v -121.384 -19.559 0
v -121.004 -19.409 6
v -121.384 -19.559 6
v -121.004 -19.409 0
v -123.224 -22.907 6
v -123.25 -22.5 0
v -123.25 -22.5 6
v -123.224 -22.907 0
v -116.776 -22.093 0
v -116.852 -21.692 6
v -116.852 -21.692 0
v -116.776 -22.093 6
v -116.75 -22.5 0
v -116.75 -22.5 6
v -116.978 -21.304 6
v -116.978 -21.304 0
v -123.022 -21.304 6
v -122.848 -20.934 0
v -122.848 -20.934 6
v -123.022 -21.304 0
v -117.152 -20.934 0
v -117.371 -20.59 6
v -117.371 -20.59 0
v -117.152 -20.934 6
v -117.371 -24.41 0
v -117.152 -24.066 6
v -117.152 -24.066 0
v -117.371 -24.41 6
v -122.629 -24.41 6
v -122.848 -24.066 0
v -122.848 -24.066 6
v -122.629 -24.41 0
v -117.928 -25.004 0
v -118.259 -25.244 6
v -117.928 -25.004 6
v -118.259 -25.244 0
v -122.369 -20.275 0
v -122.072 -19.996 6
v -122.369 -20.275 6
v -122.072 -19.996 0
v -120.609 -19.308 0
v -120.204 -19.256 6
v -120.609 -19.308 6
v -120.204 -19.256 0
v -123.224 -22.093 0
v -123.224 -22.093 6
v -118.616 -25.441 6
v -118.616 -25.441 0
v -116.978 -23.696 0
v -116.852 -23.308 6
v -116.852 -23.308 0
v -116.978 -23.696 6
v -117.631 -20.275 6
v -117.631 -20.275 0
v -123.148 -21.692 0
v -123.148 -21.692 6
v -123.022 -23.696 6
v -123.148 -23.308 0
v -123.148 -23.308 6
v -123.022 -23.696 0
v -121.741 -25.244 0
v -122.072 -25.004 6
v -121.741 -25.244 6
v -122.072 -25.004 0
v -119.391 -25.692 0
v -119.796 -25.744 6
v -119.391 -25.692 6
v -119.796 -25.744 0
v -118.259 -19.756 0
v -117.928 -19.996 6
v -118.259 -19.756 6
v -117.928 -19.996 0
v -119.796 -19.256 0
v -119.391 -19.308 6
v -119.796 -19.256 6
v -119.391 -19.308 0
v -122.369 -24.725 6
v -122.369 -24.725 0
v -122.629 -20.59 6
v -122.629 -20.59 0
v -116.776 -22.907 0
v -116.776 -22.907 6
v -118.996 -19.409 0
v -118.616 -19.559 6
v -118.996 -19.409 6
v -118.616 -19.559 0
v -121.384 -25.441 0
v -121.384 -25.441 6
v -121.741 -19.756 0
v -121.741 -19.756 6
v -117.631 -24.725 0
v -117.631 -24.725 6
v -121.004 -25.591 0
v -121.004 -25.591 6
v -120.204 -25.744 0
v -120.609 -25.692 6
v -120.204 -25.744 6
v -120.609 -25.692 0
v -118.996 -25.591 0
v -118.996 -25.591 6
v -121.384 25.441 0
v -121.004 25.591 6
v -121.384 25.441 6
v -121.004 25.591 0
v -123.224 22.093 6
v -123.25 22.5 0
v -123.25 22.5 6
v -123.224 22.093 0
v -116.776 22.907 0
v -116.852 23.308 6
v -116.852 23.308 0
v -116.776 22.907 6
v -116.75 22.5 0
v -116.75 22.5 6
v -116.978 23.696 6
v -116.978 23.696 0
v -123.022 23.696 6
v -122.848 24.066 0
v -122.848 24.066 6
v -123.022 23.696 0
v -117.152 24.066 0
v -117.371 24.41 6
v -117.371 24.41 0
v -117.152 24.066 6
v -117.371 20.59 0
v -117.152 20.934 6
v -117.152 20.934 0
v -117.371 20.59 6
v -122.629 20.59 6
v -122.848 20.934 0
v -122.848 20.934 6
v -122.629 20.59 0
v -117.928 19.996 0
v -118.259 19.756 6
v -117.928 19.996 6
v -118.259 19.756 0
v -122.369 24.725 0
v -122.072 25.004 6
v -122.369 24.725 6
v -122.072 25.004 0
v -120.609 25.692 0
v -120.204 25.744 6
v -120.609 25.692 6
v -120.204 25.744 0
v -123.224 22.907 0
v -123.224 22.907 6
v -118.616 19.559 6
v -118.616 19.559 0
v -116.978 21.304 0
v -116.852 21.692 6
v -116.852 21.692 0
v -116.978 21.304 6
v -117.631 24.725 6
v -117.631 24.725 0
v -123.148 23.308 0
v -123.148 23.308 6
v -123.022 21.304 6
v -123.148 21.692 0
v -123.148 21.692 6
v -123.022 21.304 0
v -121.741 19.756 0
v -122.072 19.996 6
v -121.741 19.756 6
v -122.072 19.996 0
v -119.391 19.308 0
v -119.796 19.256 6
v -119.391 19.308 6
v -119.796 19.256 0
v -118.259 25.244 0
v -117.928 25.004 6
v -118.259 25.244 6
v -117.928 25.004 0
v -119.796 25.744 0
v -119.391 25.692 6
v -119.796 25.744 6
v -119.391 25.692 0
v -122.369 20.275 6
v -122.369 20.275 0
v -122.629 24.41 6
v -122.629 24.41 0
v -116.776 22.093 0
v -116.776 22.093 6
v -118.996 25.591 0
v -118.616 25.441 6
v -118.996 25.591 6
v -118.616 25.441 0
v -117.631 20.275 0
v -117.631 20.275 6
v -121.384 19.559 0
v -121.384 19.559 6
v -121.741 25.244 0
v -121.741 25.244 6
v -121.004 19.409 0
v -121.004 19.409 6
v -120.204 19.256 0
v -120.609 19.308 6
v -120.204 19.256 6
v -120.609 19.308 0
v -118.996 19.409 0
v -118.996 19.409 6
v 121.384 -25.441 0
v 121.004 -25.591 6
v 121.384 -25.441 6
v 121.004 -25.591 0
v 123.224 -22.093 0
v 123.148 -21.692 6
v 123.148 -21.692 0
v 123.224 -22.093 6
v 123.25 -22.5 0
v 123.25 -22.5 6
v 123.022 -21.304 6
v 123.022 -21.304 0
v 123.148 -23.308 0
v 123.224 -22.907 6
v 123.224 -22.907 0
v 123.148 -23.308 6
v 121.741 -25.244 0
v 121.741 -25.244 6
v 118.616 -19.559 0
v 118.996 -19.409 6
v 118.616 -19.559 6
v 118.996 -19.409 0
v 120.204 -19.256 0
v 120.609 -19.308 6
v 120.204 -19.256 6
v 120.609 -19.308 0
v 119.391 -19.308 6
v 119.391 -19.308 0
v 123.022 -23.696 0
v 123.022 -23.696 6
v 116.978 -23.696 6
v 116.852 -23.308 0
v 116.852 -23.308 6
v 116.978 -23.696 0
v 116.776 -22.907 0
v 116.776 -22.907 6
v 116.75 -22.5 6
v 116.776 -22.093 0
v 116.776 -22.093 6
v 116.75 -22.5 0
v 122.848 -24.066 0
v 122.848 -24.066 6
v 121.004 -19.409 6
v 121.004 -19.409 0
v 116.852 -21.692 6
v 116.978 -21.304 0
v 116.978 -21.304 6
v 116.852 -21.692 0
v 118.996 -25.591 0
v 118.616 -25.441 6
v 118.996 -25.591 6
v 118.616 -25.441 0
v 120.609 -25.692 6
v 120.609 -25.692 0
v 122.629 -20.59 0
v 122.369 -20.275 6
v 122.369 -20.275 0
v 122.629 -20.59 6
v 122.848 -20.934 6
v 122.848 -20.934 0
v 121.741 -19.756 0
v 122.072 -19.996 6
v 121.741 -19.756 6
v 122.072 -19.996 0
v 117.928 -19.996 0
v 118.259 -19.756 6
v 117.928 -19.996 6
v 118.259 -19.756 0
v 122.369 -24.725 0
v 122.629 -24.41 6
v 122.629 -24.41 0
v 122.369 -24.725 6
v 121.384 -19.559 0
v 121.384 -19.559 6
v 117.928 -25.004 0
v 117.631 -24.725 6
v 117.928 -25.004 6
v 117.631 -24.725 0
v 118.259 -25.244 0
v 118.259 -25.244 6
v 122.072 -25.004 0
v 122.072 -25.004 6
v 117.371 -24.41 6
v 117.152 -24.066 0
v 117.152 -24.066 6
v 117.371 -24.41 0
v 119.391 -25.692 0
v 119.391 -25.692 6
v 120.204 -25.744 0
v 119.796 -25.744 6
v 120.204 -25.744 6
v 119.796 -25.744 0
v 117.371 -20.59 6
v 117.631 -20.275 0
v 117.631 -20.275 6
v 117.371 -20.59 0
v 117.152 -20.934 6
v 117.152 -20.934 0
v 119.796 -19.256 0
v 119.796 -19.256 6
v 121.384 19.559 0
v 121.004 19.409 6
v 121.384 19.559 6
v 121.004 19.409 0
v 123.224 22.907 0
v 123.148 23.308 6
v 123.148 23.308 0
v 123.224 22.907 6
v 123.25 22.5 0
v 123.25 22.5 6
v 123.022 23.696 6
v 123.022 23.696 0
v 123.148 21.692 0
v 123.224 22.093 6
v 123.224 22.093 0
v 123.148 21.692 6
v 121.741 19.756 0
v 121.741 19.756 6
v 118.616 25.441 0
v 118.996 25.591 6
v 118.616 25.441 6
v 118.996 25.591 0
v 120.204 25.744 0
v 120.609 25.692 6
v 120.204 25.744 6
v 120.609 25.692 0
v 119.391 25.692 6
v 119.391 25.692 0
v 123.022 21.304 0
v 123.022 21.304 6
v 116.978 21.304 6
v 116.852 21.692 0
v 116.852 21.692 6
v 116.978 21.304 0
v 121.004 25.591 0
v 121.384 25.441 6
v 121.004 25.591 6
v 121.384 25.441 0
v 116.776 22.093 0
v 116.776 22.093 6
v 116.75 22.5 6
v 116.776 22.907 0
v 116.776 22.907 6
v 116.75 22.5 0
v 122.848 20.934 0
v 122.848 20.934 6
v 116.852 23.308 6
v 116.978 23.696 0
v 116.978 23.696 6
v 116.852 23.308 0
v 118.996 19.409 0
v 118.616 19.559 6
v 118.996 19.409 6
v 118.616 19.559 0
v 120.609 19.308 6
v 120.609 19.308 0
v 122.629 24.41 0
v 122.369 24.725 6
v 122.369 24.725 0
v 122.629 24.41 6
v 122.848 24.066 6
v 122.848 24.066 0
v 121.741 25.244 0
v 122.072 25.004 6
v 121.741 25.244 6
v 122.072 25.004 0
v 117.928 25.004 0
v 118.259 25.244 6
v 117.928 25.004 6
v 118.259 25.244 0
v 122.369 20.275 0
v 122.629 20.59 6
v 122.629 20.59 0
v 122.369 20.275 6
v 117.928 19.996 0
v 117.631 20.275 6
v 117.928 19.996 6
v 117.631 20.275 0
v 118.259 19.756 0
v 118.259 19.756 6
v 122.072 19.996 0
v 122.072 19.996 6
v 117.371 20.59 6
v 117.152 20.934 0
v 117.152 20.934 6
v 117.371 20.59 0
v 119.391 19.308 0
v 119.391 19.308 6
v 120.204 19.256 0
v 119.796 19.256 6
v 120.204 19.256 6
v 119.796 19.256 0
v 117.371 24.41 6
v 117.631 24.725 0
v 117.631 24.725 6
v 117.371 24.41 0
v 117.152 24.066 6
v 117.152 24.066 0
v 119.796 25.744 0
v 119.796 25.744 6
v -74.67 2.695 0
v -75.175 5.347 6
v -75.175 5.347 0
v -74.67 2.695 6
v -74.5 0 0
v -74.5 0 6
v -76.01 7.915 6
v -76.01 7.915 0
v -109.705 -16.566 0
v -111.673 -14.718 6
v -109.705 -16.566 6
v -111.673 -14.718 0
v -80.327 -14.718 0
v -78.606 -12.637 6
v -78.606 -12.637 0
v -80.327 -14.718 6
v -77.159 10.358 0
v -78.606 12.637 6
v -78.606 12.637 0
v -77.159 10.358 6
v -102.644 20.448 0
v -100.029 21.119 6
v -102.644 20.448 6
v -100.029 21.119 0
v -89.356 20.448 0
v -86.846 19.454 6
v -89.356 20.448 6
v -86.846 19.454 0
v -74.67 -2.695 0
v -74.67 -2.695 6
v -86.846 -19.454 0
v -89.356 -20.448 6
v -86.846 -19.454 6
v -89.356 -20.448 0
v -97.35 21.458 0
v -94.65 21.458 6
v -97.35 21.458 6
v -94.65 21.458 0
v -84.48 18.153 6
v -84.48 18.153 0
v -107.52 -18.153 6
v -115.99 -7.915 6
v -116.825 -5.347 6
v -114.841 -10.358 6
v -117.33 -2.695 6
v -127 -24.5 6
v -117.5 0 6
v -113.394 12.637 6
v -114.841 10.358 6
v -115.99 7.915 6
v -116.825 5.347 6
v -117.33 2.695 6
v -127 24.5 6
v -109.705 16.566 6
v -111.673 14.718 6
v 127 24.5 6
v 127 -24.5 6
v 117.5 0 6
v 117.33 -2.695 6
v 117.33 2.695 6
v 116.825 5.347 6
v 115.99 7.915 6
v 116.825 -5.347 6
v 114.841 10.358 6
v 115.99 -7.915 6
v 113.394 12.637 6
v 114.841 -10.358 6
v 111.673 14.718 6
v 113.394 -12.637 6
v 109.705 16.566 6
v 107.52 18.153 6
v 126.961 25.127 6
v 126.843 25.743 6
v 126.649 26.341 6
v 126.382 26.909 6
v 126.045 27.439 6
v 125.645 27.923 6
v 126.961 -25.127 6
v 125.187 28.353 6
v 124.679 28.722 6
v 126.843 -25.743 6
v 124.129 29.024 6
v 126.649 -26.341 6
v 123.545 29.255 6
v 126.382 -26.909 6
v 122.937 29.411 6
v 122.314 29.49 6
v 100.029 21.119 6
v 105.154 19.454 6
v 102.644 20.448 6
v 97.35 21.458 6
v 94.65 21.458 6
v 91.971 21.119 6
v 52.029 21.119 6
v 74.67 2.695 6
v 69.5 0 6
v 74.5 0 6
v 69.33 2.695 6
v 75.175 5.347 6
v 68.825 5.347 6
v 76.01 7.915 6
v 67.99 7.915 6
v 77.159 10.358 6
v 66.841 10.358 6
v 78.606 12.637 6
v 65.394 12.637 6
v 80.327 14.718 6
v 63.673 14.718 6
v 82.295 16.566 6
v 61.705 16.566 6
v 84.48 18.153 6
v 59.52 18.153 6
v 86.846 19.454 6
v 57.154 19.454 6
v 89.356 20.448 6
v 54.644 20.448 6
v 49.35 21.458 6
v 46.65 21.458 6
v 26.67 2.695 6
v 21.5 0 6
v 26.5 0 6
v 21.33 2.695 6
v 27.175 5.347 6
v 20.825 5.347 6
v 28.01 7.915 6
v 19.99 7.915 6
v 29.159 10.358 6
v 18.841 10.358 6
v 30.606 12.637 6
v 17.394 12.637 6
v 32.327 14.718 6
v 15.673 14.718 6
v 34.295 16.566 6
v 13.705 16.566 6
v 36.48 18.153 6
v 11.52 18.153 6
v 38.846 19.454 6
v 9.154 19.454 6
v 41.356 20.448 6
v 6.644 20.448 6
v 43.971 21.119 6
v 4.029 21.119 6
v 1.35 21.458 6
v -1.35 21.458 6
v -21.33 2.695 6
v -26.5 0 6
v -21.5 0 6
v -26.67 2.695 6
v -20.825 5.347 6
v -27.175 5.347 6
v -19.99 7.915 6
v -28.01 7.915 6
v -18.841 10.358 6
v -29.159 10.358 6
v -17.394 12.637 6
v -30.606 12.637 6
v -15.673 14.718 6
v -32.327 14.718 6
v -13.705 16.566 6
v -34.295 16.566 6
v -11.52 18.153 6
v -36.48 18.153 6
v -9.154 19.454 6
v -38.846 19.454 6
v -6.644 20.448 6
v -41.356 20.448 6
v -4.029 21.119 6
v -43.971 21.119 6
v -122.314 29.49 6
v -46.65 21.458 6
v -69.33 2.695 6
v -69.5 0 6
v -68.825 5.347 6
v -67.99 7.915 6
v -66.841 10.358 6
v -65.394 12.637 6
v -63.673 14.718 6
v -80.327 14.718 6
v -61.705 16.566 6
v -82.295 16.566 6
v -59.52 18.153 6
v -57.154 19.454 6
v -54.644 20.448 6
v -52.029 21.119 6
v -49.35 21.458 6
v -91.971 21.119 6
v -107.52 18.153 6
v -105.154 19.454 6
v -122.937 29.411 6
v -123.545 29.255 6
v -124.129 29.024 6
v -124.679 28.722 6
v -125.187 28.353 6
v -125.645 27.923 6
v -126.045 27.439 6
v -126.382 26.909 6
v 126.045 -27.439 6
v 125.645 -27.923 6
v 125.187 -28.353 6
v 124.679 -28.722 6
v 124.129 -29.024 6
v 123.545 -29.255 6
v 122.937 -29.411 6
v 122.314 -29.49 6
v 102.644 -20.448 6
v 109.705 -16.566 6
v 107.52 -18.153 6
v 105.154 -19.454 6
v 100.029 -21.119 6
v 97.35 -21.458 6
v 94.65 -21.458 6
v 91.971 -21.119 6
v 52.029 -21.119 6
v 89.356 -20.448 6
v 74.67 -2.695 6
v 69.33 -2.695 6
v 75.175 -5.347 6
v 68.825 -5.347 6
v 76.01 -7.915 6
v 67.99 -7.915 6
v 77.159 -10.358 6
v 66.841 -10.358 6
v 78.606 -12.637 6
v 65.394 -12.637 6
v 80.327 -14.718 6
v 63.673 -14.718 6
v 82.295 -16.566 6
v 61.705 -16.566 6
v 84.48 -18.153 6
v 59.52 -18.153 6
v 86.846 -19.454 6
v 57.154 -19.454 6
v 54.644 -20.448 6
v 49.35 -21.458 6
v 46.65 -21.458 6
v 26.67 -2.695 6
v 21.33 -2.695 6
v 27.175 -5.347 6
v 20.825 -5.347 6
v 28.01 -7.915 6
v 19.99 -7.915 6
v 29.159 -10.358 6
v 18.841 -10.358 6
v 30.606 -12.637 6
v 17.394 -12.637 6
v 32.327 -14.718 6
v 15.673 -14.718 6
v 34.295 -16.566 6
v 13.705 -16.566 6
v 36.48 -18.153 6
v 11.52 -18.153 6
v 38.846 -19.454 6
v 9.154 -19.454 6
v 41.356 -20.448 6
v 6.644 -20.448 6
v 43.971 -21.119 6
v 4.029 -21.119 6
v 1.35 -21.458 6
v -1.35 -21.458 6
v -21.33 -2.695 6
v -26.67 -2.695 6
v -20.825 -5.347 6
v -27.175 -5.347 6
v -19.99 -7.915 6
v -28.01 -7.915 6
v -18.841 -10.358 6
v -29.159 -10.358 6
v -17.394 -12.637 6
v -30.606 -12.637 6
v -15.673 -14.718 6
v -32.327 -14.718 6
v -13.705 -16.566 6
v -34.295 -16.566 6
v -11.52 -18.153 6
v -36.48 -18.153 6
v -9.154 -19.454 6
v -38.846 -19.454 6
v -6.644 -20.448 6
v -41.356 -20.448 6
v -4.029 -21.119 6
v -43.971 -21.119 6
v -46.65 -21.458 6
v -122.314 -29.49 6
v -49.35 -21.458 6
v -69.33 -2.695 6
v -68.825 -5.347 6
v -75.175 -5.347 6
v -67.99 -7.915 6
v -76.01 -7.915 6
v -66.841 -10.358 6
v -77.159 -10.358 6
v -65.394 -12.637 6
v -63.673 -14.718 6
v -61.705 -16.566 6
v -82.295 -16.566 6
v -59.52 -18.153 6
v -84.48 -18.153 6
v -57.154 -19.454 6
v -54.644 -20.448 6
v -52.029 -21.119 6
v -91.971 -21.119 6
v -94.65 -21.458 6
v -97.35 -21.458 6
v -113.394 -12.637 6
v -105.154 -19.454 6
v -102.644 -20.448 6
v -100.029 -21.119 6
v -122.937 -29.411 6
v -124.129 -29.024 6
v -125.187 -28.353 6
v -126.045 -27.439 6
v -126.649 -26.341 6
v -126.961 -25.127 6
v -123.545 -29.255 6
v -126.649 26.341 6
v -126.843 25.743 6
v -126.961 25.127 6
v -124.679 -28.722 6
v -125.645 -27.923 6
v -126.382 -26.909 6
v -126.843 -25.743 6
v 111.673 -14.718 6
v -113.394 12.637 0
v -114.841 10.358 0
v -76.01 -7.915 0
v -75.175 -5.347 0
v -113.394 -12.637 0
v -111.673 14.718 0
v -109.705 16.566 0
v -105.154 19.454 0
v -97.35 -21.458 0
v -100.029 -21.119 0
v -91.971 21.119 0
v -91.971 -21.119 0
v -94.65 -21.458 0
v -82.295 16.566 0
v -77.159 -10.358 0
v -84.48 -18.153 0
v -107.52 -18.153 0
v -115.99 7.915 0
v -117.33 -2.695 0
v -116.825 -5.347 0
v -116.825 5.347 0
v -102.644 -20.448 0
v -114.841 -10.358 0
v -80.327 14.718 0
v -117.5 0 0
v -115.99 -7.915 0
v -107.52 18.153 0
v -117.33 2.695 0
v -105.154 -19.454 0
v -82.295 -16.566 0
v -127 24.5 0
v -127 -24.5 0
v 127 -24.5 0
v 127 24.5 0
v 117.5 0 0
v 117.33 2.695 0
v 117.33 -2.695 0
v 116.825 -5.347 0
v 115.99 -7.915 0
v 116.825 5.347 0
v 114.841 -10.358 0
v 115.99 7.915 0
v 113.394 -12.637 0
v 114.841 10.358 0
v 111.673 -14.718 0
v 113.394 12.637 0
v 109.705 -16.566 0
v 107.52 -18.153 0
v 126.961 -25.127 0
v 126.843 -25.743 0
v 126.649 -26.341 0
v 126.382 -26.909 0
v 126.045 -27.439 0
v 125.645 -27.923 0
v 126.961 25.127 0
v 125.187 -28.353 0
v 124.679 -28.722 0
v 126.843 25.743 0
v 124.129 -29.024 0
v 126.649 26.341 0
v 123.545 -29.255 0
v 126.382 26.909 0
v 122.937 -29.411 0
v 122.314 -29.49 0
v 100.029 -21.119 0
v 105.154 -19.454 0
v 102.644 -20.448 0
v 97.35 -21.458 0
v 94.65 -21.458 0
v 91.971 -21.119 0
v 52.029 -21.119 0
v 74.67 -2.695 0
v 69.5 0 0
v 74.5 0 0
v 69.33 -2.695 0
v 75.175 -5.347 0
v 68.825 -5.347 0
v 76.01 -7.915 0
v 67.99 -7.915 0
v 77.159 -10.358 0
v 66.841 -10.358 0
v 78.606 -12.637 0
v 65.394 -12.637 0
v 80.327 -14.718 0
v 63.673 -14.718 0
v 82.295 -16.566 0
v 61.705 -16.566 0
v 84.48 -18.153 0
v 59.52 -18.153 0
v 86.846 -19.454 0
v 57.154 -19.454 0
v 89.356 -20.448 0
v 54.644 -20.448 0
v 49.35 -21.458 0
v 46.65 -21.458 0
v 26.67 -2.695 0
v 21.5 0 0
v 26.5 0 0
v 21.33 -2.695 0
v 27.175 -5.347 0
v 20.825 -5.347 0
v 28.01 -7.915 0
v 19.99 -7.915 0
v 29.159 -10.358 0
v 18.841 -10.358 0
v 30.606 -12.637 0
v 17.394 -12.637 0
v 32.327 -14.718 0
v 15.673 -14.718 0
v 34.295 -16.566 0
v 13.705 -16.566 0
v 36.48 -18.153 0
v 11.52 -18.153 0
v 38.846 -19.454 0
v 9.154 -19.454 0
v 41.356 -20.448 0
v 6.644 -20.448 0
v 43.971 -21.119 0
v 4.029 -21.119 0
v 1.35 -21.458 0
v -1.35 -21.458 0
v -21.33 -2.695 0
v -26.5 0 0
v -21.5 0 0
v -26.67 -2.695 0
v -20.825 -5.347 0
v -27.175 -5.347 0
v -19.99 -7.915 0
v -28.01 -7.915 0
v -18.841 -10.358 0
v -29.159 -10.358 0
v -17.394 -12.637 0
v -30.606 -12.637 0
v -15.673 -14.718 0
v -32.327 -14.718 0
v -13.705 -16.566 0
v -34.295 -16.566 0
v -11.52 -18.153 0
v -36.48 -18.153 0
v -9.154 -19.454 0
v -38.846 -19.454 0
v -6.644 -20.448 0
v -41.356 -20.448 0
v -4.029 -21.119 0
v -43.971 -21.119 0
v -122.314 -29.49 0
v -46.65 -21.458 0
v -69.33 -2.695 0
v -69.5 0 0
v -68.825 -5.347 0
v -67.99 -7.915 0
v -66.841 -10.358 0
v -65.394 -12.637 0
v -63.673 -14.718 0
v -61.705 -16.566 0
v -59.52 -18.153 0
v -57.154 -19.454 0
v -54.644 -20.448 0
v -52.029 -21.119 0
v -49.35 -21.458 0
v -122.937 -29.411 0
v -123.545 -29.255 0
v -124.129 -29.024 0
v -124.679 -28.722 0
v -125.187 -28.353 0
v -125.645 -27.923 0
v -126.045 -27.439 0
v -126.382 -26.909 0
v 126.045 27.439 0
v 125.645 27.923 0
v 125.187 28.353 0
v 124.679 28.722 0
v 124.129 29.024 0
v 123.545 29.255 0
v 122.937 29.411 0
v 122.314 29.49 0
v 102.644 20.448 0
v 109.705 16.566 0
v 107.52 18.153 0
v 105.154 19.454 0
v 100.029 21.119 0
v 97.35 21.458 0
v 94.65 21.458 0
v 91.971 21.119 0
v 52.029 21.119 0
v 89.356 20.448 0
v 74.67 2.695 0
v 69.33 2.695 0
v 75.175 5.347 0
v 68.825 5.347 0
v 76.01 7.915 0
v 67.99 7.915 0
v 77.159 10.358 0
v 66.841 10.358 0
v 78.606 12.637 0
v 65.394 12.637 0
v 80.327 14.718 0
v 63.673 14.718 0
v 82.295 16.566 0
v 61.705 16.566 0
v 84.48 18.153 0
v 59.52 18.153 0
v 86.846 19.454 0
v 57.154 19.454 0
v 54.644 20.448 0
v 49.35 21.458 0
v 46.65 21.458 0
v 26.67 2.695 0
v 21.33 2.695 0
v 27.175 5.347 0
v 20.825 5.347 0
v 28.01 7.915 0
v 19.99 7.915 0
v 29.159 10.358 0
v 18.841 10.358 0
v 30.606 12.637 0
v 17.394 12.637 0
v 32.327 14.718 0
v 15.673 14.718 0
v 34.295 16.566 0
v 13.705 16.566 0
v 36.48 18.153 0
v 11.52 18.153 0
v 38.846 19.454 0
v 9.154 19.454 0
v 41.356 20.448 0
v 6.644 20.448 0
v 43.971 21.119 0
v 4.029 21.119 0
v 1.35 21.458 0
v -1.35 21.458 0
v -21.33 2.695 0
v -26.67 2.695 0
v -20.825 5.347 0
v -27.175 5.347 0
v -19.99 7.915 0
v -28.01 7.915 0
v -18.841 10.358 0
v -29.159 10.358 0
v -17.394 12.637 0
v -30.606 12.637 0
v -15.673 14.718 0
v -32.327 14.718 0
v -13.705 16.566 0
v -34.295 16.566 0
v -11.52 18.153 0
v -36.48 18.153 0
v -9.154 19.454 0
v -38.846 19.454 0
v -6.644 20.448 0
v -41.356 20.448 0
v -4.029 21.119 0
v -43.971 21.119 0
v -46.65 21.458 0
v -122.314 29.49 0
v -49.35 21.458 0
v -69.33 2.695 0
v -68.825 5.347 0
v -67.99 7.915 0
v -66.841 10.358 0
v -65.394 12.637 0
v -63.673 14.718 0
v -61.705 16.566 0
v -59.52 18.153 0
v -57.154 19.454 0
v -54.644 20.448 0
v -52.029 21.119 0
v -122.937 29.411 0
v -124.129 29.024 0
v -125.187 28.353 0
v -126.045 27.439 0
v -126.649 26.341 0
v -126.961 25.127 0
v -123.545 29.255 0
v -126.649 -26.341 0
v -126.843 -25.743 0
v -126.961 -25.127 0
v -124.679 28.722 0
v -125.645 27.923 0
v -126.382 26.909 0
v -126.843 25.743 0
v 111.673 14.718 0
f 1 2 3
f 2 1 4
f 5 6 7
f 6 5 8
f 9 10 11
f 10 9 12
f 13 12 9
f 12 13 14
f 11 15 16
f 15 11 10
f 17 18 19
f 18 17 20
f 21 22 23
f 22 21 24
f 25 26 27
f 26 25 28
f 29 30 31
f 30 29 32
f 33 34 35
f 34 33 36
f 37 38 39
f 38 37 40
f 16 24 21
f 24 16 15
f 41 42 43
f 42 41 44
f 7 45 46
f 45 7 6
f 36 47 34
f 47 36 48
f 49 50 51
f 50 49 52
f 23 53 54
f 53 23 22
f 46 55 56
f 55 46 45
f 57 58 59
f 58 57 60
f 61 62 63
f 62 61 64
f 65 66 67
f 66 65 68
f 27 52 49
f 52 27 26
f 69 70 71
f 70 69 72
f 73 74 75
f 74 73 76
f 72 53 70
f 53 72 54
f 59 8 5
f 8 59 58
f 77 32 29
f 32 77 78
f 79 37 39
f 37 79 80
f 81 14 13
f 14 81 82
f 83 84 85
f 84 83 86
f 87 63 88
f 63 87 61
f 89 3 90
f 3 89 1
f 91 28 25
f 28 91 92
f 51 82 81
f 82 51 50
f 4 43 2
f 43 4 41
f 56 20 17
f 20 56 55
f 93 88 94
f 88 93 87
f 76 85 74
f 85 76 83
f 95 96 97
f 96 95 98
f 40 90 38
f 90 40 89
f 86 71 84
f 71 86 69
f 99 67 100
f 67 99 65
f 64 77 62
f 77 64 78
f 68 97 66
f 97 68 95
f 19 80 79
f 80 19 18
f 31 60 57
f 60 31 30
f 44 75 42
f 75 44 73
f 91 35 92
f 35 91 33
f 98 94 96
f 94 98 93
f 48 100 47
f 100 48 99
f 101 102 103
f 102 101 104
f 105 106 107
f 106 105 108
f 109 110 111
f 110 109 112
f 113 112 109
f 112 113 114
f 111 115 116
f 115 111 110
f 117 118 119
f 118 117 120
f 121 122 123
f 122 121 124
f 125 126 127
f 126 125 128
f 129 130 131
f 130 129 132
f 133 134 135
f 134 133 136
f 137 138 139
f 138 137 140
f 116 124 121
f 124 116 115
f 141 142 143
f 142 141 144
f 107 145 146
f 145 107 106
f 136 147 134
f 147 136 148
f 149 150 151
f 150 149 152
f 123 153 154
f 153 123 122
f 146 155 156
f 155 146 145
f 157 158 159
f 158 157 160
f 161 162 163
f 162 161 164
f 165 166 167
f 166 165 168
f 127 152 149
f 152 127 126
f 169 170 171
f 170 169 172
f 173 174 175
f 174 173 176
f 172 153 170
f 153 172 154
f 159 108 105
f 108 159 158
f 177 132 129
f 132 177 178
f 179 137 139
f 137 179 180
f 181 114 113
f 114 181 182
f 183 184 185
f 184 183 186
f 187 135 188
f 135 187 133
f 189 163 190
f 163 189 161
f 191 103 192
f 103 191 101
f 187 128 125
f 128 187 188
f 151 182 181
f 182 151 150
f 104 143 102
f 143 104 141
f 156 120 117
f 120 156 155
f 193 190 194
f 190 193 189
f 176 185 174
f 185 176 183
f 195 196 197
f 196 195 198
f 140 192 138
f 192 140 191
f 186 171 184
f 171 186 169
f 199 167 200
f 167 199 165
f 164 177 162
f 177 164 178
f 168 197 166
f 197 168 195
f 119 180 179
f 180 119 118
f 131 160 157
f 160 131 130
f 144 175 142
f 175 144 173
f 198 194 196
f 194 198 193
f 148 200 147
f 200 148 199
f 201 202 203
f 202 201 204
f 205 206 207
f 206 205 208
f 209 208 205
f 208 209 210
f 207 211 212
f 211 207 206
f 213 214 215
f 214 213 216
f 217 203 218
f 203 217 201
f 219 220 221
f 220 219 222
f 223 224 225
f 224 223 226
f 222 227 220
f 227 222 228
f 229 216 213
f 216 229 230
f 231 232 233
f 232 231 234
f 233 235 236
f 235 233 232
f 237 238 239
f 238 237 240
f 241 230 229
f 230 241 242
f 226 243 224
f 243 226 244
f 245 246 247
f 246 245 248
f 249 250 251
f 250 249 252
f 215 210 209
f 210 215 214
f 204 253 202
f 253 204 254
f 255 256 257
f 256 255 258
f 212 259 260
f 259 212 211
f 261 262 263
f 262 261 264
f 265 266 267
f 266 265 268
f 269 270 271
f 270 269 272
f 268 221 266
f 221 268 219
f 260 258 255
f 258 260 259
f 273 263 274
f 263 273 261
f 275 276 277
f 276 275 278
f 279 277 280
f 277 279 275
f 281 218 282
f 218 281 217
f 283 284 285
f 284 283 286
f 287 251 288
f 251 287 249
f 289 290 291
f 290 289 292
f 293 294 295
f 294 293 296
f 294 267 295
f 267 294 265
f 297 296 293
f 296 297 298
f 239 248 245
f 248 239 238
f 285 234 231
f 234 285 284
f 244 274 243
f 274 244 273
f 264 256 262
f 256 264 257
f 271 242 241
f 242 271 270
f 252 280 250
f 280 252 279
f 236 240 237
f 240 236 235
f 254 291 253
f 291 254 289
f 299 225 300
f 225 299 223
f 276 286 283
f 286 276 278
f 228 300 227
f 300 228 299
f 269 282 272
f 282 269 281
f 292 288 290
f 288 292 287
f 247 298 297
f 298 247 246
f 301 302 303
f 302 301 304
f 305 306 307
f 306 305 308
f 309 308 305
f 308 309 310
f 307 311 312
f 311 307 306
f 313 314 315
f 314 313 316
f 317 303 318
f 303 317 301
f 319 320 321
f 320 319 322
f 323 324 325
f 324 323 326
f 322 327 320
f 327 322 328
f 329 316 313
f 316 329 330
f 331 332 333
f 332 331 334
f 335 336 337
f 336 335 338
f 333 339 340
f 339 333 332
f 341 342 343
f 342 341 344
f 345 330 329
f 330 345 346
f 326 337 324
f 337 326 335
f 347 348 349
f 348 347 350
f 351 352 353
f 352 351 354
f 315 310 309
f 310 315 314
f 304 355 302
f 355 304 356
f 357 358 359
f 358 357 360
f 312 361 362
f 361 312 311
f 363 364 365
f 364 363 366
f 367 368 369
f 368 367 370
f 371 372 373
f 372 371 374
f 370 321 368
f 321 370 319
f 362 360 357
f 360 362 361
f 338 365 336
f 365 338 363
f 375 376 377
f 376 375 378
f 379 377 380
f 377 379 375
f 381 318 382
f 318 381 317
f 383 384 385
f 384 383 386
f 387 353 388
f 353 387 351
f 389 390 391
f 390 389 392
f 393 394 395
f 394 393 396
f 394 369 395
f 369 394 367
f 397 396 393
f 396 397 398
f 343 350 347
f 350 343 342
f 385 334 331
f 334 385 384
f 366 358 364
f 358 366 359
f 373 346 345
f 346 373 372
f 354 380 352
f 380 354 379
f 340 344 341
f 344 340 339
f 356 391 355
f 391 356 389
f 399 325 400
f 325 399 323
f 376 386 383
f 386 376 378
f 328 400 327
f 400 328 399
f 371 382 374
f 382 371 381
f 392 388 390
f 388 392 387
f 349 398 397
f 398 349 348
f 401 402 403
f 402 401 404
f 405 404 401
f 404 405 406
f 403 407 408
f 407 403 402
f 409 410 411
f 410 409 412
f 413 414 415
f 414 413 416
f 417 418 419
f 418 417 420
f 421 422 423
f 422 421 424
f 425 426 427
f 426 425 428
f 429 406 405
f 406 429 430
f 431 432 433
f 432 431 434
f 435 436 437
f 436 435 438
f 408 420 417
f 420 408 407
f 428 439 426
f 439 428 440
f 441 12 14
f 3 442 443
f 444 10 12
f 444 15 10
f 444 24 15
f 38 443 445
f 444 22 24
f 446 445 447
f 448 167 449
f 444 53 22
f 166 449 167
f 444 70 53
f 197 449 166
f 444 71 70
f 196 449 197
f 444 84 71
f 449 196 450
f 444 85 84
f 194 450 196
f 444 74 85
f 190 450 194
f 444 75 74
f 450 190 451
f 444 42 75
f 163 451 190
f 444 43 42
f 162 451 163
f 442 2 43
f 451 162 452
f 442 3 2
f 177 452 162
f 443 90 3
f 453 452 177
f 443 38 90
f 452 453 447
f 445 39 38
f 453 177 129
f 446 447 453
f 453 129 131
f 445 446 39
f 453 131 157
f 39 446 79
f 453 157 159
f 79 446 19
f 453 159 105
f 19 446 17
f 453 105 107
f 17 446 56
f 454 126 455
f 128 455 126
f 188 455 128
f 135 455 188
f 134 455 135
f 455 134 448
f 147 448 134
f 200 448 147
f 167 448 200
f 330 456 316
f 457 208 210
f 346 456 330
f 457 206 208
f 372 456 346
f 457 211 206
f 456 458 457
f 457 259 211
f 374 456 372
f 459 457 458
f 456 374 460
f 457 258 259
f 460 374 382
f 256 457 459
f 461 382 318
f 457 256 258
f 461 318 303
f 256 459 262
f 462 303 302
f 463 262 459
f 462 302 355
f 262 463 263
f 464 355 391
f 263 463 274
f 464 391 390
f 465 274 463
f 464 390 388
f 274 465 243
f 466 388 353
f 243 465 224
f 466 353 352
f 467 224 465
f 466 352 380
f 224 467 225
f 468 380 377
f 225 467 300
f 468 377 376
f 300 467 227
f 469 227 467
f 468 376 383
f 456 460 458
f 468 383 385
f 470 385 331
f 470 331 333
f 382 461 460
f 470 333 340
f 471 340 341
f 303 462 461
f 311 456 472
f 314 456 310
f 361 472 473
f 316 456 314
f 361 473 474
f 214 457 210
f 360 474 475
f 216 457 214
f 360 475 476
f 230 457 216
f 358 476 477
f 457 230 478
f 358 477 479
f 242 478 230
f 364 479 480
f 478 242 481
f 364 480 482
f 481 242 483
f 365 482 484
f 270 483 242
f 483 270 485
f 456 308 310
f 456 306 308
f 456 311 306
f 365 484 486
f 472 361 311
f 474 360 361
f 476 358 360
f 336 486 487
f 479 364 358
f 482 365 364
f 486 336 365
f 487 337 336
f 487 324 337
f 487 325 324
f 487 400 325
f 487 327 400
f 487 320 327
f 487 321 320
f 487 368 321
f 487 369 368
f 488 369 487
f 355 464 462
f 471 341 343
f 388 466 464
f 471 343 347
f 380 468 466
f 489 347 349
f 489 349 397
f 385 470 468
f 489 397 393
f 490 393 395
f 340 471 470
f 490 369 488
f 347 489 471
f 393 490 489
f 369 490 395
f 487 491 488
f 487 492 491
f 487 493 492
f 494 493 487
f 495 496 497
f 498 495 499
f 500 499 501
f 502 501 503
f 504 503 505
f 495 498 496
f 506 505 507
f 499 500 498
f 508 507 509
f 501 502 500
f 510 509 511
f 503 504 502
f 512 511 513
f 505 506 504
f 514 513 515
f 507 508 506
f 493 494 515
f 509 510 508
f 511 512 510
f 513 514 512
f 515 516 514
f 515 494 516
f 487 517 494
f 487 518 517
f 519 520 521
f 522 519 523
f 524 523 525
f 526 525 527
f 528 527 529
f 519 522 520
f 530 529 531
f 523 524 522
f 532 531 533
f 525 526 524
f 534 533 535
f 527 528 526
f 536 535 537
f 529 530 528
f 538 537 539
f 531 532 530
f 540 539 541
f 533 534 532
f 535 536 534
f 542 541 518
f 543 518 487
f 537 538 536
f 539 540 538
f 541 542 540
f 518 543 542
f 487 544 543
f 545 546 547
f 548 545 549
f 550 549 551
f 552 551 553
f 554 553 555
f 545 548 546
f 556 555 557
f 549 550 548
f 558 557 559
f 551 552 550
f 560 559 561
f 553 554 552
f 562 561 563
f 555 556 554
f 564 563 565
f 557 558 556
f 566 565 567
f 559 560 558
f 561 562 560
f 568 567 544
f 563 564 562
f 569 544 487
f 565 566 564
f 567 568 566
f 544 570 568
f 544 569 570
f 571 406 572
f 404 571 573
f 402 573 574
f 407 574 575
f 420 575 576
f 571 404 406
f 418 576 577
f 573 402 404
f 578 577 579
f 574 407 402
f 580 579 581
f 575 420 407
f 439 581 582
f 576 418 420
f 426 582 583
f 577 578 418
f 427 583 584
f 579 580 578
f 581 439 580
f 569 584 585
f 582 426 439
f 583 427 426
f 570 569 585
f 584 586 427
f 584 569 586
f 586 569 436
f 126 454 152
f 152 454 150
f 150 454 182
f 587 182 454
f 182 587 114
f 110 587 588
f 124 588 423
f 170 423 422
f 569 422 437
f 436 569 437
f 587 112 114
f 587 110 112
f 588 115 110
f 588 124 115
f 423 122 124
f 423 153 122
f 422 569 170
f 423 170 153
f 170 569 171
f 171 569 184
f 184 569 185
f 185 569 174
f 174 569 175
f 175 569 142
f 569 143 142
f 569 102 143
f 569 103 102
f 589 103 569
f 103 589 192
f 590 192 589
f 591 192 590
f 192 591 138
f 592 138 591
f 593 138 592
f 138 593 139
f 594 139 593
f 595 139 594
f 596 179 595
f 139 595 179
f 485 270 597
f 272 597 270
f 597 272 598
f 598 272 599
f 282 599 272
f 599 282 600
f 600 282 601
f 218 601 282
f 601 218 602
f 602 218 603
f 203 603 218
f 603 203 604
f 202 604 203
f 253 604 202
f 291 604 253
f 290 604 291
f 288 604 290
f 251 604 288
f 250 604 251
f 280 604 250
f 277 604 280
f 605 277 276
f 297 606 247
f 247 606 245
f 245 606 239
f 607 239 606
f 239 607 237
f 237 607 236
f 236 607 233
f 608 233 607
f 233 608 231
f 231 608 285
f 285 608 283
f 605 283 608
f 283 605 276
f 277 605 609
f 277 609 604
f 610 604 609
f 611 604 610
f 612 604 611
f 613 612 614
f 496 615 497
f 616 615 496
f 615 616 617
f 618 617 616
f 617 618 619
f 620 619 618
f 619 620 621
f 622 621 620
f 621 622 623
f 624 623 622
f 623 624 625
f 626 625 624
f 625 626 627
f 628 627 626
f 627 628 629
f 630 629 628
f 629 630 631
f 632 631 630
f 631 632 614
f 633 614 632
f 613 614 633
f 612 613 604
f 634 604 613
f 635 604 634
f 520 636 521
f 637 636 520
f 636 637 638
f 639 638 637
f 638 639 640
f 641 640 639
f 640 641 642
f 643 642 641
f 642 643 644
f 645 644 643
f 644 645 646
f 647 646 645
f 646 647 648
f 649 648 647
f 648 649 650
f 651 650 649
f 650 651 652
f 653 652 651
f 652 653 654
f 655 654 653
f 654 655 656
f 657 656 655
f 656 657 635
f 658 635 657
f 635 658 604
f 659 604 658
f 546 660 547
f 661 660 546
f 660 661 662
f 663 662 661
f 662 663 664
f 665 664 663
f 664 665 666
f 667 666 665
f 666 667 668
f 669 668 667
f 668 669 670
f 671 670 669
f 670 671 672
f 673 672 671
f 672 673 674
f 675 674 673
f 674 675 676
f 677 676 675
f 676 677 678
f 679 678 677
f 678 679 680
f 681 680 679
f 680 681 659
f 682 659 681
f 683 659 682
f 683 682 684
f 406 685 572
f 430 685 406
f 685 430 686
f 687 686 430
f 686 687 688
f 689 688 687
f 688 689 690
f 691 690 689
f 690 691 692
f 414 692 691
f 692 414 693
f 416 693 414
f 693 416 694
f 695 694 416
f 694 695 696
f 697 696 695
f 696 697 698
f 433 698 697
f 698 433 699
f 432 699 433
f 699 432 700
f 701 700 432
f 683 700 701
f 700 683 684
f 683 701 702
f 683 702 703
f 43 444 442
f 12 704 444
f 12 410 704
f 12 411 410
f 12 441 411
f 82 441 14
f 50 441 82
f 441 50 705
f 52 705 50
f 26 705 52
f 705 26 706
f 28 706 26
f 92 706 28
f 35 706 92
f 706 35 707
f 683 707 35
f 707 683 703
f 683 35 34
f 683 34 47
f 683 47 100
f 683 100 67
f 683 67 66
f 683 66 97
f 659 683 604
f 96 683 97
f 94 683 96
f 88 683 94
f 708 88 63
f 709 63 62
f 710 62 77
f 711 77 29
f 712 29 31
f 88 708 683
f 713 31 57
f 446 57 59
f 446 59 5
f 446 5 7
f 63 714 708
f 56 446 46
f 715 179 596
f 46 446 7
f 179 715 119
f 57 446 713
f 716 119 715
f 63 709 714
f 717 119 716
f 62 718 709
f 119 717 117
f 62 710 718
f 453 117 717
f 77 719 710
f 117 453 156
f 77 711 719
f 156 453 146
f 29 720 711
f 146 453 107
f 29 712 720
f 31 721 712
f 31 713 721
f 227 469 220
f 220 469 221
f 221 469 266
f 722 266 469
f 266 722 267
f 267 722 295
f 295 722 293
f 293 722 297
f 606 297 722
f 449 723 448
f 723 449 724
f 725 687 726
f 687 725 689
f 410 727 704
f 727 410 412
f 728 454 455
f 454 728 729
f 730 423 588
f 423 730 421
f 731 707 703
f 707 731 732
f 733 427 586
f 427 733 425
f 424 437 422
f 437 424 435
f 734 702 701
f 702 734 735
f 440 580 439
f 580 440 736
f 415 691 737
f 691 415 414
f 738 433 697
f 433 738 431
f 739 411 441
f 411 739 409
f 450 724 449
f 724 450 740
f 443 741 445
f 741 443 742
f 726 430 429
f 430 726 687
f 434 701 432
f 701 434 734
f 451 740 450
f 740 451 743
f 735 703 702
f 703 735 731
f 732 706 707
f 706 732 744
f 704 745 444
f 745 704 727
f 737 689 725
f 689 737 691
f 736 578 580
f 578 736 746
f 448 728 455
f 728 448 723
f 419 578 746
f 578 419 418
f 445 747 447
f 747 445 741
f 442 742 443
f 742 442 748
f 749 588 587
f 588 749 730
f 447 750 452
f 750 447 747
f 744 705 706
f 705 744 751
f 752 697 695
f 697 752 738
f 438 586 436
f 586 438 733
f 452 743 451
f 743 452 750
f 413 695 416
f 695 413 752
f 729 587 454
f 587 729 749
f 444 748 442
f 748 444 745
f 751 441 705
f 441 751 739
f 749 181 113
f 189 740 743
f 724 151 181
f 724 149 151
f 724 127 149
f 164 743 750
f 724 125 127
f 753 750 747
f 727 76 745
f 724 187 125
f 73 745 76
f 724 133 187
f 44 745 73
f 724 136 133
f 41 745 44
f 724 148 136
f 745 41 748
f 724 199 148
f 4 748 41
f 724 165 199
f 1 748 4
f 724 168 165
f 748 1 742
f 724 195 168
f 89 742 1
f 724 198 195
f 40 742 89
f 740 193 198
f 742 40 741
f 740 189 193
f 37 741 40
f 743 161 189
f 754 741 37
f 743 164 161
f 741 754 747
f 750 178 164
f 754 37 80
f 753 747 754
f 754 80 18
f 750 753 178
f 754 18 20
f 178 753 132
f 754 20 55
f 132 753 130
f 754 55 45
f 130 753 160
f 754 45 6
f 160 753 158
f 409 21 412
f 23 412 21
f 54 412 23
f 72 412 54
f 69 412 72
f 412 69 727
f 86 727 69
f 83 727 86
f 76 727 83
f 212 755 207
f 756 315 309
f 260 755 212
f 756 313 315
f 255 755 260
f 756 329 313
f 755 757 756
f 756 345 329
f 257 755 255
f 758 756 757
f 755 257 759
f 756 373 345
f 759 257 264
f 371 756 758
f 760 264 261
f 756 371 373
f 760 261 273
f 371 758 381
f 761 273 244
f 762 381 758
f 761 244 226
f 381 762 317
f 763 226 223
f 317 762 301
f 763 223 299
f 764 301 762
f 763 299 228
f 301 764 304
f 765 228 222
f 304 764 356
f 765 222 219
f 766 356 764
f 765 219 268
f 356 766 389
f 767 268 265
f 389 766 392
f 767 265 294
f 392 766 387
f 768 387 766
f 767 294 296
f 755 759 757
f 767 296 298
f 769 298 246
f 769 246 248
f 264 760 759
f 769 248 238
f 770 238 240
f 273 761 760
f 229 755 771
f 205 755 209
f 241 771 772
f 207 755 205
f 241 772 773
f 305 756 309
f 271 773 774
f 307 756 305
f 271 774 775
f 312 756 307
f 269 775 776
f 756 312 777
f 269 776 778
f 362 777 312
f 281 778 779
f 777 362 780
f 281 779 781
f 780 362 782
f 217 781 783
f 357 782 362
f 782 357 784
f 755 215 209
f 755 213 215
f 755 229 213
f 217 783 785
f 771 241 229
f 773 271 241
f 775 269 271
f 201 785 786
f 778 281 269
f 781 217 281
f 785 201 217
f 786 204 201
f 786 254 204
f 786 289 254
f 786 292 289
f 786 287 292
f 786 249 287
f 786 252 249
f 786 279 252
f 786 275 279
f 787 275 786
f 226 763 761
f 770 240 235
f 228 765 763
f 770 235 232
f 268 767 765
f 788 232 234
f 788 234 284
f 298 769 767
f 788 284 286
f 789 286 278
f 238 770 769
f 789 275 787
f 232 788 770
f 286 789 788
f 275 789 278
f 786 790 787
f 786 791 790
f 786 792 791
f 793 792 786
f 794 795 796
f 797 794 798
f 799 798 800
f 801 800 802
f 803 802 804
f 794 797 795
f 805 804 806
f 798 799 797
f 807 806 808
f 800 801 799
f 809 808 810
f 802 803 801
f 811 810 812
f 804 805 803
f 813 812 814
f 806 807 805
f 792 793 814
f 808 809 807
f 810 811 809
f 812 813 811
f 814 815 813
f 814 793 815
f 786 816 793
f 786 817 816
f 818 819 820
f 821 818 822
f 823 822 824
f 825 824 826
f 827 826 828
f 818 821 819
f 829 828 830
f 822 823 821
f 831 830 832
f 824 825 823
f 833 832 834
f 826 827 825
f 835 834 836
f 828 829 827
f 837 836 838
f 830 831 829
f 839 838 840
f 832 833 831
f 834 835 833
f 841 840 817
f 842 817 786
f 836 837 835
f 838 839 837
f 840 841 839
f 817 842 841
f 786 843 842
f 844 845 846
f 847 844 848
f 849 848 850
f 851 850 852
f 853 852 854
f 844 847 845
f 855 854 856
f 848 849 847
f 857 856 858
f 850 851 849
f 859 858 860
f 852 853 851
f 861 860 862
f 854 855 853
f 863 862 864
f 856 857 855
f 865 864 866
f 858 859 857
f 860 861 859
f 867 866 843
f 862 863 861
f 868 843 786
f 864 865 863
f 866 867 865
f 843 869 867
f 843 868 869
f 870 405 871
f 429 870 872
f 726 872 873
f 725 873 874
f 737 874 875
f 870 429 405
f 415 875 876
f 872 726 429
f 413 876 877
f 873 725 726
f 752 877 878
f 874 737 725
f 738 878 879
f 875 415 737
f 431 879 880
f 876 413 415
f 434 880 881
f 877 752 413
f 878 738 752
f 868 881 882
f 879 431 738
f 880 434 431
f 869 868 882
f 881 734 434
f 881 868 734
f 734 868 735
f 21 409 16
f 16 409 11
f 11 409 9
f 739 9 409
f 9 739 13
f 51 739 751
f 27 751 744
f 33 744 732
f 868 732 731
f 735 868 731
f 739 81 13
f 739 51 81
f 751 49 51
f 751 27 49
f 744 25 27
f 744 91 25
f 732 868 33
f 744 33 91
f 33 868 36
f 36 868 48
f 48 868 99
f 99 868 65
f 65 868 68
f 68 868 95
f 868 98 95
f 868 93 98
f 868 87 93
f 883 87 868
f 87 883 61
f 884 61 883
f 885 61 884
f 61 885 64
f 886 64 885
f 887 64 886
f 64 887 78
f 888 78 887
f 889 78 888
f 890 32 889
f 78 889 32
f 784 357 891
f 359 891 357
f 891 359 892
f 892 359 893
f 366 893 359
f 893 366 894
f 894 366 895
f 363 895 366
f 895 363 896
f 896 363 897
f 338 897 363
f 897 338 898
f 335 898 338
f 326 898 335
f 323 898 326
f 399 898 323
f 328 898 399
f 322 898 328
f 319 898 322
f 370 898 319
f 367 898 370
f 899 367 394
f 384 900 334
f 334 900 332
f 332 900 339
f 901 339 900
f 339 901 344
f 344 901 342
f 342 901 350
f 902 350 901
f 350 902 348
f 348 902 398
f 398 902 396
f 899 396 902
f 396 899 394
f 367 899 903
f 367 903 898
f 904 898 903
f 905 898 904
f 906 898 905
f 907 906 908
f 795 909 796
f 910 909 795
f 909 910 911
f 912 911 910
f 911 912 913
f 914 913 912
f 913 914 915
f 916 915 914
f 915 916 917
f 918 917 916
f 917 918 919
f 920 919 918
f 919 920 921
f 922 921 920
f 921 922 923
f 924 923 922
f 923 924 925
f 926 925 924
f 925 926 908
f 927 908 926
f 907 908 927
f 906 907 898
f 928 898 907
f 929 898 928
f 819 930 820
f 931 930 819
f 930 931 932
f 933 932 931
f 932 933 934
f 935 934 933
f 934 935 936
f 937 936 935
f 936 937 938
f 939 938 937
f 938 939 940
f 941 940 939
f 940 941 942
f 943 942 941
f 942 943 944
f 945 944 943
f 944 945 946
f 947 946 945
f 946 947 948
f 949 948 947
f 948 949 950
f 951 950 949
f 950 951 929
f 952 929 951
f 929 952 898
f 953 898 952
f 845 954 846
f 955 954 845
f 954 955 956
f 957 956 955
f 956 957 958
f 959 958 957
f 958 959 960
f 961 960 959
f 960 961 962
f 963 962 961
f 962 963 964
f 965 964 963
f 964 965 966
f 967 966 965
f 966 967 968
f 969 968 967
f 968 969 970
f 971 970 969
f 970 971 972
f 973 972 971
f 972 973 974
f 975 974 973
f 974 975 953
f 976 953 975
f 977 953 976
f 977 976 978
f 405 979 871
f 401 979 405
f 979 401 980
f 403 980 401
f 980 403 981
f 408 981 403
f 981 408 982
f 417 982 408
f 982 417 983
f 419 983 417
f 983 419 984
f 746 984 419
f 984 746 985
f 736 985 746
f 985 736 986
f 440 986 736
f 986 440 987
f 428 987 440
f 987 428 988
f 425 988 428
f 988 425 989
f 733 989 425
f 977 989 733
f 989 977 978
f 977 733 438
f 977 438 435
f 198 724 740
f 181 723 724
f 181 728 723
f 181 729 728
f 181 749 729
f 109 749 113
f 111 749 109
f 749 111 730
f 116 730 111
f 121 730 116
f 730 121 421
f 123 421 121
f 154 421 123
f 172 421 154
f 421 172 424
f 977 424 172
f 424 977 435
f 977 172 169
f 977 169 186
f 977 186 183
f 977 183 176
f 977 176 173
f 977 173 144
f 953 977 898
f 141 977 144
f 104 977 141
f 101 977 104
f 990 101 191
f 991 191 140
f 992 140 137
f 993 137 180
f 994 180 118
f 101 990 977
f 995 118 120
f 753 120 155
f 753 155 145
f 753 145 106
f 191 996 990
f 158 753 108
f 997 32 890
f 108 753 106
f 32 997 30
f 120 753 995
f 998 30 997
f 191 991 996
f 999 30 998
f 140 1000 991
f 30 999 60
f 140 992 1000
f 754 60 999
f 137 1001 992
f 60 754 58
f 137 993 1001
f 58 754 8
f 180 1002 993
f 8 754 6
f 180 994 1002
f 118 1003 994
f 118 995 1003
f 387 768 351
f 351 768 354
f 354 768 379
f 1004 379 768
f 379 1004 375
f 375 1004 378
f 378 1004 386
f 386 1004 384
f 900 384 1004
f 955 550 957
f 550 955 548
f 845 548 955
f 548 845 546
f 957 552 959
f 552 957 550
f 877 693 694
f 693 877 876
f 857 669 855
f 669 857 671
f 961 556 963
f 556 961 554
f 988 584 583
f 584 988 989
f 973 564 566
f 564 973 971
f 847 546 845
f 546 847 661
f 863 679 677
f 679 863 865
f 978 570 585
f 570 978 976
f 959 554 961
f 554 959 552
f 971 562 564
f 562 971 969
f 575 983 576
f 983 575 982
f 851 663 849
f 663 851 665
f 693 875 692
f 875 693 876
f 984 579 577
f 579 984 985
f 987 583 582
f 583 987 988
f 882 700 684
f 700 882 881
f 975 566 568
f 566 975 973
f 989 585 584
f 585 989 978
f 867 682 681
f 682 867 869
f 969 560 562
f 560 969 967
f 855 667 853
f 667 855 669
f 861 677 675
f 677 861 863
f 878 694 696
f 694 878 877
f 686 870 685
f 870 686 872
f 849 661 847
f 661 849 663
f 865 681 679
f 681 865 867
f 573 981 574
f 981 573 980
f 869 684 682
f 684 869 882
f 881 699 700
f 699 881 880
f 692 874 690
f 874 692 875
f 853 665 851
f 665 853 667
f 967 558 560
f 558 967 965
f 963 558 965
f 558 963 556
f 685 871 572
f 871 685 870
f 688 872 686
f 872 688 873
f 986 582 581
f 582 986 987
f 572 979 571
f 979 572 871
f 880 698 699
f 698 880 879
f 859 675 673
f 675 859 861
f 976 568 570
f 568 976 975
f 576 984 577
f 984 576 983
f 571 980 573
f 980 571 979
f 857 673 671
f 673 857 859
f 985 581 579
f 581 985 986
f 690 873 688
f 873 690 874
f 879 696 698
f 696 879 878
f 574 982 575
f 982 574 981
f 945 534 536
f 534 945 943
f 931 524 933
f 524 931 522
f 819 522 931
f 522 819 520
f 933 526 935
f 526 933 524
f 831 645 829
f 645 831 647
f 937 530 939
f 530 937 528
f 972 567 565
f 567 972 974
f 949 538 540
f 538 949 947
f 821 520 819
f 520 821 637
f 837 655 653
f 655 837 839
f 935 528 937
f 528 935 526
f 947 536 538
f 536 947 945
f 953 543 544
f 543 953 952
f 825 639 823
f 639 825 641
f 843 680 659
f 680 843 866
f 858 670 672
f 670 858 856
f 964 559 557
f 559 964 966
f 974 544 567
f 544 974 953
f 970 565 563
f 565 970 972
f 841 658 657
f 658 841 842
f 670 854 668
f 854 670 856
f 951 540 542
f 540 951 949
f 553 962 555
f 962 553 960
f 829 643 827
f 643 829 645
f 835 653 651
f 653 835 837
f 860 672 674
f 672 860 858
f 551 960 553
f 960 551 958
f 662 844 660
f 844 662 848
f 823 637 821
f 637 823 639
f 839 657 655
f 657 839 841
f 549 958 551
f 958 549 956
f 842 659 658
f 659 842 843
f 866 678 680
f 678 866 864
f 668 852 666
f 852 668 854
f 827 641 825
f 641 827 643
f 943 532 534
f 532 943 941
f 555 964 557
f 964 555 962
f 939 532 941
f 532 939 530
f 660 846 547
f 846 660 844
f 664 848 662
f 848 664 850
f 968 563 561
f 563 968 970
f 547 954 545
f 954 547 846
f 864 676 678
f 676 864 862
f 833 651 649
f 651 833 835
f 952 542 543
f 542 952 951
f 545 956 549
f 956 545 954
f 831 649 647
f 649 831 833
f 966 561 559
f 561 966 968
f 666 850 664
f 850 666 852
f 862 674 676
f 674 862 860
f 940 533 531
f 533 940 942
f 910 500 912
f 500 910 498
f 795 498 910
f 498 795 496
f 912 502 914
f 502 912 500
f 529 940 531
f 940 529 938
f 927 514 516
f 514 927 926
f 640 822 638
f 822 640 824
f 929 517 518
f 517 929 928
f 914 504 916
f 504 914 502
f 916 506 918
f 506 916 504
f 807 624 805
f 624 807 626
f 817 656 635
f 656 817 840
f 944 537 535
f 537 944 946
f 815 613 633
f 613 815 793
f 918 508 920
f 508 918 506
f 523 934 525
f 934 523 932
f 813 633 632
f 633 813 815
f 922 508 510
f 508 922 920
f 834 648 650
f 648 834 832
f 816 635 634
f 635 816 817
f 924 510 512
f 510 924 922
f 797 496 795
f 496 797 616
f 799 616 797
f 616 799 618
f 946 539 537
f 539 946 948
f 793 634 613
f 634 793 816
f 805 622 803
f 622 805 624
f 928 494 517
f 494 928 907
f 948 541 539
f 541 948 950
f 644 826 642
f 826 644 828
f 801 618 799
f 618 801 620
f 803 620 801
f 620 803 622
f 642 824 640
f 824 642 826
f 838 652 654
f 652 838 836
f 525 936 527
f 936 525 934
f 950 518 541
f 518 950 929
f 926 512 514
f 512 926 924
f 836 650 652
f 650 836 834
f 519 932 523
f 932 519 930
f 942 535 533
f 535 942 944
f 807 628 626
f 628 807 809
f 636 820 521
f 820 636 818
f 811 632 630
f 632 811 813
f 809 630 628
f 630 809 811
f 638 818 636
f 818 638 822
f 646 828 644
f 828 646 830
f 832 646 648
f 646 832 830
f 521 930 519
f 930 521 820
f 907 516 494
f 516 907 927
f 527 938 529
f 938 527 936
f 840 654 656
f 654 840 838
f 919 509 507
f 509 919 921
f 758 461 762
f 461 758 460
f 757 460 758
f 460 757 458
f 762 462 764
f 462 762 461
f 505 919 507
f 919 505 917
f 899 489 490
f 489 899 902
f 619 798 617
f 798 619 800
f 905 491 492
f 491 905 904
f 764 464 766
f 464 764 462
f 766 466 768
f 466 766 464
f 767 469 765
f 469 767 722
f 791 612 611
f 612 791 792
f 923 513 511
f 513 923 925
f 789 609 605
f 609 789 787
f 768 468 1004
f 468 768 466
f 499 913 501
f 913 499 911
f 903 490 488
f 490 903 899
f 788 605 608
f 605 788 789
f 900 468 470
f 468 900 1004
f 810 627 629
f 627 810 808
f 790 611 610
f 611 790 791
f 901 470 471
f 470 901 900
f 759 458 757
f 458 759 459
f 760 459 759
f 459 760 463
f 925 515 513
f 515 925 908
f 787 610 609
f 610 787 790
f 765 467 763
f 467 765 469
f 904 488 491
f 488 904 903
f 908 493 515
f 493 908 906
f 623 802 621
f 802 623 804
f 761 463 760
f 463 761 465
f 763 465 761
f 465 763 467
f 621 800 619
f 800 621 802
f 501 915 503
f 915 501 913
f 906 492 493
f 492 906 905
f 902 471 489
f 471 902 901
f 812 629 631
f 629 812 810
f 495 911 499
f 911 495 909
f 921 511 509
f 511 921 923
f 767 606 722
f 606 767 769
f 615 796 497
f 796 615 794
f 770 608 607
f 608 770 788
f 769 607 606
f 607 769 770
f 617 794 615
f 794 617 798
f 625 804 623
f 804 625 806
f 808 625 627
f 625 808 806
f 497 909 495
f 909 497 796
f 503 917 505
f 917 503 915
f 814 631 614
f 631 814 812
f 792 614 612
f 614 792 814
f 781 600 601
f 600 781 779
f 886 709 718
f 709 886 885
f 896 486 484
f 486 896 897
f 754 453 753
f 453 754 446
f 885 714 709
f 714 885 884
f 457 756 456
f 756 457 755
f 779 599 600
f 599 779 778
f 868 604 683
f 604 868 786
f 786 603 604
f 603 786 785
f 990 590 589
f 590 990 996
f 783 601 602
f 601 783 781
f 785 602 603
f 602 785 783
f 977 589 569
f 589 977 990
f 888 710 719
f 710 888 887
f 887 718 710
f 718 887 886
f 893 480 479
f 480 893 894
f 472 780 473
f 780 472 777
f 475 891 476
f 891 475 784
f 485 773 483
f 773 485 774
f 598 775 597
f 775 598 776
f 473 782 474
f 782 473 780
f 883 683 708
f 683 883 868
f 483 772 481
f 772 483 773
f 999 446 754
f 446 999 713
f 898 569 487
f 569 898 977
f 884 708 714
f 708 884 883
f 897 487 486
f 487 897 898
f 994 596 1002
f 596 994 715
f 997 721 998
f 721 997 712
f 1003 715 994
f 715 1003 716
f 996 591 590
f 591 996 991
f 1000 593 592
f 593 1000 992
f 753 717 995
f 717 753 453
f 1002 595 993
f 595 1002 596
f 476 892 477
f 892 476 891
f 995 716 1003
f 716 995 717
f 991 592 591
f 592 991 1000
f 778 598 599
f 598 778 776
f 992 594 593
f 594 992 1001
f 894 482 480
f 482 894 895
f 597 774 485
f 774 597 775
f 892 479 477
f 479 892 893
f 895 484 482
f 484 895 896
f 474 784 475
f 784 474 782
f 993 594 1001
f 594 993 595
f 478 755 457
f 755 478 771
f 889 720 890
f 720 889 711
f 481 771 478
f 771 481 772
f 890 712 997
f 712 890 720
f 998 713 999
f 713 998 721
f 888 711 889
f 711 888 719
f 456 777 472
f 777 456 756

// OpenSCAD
$fn = 50;


difference() {
	union() {
		hull() {
			translate(v = [-122.0000000000, 24.5000000000, 0]) {
				cylinder(h = 6, r = 5);
			}
			translate(v = [122.0000000000, 24.5000000000, 0]) {
				cylinder(h = 6, r = 5);
			}
			translate(v = [-122.0000000000, -24.5000000000, 0]) {
				cylinder(h = 6, r = 5);
			}
			translate(v = [122.0000000000, -24.5000000000, 0]) {
				cylinder(h = 6, r = 5);
			}
		}
	}
	union() {
		#translate(v = [-120.0000000000, -22.5000000000, -100.0000000000]) {
			cylinder(h = 200, r = 3.2500000000);
		}
		#translate(v = [-120.0000000000, 22.5000000000, -100.0000000000]) {
			cylinder(h = 200, r = 3.2500000000);
		}
		#translate(v = [120.0000000000, -22.5000000000, -100.0000000000]) {
			cylinder(h = 200, r = 3.2500000000);
		}
		#translate(v = [120.0000000000, 22.5000000000, -100.0000000000]) {
			cylinder(h = 200, r = 3.2500000000);
		}
		#translate(v = [-96.0000000000, 0, 0]) {
			cylinder(h = 6, r = 21.5000000000);
		}
		#translate(v = [-48.0000000000, 0, 0]) {
			cylinder(h = 6, r = 21.5000000000);
		}
		#cylinder(h = 6, r = 21.5000000000);
		#translate(v = [48.0000000000, 0, 0]) {
			cylinder(h = 6, r = 21.5000000000);
		}
		#translate(v = [96.0000000000, 0, 0]) {
			cylinder(h = 6, r = 21.5000000000);
		}
	}
}
